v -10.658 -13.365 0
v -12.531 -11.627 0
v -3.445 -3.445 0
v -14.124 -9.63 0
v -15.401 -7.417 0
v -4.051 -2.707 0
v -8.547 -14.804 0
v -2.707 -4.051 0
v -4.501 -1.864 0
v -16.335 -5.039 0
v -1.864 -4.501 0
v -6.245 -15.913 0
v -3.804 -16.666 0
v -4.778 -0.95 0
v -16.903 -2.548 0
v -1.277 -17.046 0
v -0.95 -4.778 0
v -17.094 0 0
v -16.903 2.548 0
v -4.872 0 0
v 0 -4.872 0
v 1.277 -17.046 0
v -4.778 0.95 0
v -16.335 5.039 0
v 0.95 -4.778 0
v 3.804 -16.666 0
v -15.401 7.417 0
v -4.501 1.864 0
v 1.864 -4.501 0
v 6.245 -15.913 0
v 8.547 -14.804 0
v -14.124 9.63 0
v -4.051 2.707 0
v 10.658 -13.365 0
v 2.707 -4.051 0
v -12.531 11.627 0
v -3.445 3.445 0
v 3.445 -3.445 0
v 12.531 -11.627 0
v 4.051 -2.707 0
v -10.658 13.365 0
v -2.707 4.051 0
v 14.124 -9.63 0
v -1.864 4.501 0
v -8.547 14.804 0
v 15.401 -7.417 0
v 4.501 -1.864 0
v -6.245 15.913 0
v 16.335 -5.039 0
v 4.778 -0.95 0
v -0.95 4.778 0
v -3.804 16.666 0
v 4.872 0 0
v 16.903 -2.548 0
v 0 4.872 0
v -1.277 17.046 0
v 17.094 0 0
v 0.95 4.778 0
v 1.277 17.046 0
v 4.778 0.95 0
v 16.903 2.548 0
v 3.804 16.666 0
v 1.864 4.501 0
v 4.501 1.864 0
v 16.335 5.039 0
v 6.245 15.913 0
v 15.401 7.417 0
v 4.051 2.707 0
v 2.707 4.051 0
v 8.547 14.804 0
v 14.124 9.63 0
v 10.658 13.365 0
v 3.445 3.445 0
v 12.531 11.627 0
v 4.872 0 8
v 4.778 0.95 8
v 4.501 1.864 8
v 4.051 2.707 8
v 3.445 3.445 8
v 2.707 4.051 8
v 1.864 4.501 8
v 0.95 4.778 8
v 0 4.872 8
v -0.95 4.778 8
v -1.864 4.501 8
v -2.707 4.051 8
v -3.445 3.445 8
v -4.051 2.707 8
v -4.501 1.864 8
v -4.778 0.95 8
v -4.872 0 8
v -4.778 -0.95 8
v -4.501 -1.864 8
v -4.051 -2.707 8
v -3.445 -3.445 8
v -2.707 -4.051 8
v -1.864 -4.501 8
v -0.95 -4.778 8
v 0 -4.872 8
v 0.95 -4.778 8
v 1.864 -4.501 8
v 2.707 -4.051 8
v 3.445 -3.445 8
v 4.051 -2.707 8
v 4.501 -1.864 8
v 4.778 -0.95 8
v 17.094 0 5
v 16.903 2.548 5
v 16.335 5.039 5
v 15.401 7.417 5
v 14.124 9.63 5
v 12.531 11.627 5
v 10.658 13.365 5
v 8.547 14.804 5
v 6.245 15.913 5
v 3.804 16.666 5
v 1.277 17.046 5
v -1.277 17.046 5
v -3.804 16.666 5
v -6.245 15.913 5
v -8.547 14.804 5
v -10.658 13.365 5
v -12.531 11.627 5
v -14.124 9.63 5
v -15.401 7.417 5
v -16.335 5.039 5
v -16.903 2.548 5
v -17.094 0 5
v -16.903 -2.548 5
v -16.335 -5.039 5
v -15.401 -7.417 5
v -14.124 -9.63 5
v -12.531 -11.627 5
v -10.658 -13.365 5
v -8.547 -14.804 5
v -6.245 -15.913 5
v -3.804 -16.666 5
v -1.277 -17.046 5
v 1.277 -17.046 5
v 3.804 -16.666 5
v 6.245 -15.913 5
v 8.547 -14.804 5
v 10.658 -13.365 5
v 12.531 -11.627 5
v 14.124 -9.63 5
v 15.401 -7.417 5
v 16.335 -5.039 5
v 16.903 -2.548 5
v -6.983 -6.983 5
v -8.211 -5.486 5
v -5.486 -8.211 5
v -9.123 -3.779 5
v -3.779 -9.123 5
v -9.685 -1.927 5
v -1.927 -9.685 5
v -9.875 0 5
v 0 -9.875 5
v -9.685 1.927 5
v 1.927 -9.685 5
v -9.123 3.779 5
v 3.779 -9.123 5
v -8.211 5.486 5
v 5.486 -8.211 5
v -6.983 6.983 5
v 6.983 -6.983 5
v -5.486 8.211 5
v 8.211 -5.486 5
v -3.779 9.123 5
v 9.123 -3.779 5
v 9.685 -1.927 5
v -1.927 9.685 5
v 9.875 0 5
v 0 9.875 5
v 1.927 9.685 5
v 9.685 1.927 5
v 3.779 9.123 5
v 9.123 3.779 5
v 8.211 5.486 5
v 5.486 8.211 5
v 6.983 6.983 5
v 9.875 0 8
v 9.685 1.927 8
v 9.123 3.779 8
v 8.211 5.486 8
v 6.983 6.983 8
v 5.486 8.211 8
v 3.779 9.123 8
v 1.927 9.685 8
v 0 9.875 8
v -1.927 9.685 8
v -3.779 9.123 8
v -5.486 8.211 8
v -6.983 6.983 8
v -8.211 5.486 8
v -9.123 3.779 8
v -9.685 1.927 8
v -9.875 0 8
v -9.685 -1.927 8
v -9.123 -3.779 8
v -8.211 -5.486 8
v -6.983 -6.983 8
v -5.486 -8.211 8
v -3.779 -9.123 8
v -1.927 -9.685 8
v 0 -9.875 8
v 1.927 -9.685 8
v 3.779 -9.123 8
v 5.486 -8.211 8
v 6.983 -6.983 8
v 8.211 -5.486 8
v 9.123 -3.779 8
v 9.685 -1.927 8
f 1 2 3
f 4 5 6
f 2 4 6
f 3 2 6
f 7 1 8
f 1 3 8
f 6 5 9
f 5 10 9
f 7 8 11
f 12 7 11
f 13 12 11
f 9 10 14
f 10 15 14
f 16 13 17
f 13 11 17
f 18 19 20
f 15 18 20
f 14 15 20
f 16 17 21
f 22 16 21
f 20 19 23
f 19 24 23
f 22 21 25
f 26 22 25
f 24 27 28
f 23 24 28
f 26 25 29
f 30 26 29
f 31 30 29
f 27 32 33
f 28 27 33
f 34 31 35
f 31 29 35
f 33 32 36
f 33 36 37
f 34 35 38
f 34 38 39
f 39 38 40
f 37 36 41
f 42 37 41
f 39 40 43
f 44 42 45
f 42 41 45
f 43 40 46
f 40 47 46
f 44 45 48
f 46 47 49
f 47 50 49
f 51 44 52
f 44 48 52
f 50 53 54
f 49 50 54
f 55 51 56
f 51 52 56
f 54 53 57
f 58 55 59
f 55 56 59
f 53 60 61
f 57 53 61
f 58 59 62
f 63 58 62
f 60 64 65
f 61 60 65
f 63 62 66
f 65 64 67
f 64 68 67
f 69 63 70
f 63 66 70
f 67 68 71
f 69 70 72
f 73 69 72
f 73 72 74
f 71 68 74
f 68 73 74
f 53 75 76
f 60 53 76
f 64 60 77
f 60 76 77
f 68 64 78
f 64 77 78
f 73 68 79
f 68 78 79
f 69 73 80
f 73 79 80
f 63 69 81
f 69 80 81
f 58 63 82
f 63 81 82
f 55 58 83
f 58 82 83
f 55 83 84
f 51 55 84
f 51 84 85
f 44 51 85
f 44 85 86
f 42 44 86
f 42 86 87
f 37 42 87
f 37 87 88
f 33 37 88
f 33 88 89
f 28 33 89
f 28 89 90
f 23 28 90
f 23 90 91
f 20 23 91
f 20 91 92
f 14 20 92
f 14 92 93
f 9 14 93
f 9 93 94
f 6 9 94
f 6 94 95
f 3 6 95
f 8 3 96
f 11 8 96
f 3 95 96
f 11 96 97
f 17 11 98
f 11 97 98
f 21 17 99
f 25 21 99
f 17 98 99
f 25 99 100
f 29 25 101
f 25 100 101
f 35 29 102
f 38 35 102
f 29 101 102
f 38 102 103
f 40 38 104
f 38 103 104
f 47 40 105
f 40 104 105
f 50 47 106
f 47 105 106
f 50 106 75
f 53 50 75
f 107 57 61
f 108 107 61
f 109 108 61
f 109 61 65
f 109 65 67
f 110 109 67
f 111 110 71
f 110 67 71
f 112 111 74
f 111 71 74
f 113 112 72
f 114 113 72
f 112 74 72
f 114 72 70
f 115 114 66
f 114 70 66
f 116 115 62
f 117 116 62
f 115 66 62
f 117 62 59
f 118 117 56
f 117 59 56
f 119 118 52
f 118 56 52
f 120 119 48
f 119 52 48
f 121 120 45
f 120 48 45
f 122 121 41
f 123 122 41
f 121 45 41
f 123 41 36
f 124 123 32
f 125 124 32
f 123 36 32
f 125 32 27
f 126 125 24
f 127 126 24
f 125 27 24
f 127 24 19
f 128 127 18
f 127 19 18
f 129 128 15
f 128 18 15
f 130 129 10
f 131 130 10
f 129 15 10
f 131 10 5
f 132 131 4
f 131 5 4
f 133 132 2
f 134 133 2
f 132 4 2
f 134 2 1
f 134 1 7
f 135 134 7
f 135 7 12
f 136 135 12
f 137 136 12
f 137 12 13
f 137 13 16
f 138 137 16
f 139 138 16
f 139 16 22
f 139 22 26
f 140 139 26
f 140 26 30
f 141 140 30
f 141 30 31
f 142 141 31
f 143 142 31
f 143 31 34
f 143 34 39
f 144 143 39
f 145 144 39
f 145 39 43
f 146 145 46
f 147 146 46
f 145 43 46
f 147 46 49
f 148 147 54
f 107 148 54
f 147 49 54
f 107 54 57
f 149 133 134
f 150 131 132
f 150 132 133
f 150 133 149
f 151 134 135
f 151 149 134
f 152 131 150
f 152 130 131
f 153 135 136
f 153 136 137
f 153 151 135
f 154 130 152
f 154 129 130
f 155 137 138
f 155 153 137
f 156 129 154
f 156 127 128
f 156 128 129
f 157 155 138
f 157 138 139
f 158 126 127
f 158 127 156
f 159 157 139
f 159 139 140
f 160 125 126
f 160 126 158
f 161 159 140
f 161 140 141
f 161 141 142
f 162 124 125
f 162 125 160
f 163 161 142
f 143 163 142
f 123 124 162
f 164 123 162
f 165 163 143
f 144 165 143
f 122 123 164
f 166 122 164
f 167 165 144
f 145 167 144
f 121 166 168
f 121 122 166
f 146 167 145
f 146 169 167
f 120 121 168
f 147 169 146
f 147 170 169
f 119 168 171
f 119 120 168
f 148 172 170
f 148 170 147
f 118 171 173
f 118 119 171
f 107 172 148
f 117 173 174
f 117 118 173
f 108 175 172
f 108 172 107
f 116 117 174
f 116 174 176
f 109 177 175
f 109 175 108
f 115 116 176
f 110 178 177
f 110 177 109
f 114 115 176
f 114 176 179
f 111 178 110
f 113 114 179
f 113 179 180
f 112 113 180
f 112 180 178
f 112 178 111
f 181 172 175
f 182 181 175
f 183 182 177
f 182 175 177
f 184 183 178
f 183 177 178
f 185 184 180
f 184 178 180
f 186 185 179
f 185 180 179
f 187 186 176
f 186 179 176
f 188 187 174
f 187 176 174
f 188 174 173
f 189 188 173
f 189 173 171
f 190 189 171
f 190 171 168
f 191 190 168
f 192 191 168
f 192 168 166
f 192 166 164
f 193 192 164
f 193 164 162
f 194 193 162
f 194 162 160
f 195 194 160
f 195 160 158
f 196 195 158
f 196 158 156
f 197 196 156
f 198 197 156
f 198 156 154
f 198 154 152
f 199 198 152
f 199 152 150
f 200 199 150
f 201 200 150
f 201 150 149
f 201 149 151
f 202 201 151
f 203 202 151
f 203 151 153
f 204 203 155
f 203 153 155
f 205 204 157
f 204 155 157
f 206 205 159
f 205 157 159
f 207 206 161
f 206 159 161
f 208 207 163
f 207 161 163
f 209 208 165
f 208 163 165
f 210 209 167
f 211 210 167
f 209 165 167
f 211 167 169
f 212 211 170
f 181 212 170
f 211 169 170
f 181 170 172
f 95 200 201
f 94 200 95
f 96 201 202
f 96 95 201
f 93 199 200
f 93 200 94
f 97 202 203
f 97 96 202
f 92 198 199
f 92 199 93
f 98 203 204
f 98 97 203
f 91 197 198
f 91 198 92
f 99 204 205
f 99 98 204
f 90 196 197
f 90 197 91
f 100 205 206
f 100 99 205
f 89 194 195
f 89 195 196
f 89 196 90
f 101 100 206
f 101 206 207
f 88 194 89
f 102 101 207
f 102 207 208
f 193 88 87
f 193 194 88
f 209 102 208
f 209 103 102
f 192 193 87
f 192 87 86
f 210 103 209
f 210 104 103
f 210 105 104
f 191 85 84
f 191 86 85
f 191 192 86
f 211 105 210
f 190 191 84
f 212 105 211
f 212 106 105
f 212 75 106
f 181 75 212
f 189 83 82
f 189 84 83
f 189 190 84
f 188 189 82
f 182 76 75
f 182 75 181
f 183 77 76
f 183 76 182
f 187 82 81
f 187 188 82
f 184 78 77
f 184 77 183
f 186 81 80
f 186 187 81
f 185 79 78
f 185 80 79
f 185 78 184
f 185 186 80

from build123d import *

# Parameters (mm, degrees)
F0_R     = 9.875
F0_R_2   = 4.875
F1_DEPTH = 8
F0_R_3   = 17.0942544143
F2_DEPTH = 5
F3_R     = 4.8718969607
F4_DEPTH = 25


with BuildPart() as f1:
    # F0 (on Top) → F1 (new body)
    with BuildSketch(Plane.XY):
        Circle(F0_R)
        Circle(F0_R_2, mode=Mode.SUBTRACT)
        Circle(F0_R_2)
    extrude(amount=F1_DEPTH)

    # F0 (on Top) → F2 (join)
    with BuildSketch(Plane.XY):
        Circle(F0_R_3)
        Circle(F0_R, mode=Mode.SUBTRACT)
    extrude(amount=F2_DEPTH)

    # F3 (on face) → F4 (cut)
    with BuildSketch(Plane.XY.offset(8)):
        Circle(F3_R)
    extrude(amount=-F4_DEPTH, mode=Mode.SUBTRACT)


solid = f1.part
